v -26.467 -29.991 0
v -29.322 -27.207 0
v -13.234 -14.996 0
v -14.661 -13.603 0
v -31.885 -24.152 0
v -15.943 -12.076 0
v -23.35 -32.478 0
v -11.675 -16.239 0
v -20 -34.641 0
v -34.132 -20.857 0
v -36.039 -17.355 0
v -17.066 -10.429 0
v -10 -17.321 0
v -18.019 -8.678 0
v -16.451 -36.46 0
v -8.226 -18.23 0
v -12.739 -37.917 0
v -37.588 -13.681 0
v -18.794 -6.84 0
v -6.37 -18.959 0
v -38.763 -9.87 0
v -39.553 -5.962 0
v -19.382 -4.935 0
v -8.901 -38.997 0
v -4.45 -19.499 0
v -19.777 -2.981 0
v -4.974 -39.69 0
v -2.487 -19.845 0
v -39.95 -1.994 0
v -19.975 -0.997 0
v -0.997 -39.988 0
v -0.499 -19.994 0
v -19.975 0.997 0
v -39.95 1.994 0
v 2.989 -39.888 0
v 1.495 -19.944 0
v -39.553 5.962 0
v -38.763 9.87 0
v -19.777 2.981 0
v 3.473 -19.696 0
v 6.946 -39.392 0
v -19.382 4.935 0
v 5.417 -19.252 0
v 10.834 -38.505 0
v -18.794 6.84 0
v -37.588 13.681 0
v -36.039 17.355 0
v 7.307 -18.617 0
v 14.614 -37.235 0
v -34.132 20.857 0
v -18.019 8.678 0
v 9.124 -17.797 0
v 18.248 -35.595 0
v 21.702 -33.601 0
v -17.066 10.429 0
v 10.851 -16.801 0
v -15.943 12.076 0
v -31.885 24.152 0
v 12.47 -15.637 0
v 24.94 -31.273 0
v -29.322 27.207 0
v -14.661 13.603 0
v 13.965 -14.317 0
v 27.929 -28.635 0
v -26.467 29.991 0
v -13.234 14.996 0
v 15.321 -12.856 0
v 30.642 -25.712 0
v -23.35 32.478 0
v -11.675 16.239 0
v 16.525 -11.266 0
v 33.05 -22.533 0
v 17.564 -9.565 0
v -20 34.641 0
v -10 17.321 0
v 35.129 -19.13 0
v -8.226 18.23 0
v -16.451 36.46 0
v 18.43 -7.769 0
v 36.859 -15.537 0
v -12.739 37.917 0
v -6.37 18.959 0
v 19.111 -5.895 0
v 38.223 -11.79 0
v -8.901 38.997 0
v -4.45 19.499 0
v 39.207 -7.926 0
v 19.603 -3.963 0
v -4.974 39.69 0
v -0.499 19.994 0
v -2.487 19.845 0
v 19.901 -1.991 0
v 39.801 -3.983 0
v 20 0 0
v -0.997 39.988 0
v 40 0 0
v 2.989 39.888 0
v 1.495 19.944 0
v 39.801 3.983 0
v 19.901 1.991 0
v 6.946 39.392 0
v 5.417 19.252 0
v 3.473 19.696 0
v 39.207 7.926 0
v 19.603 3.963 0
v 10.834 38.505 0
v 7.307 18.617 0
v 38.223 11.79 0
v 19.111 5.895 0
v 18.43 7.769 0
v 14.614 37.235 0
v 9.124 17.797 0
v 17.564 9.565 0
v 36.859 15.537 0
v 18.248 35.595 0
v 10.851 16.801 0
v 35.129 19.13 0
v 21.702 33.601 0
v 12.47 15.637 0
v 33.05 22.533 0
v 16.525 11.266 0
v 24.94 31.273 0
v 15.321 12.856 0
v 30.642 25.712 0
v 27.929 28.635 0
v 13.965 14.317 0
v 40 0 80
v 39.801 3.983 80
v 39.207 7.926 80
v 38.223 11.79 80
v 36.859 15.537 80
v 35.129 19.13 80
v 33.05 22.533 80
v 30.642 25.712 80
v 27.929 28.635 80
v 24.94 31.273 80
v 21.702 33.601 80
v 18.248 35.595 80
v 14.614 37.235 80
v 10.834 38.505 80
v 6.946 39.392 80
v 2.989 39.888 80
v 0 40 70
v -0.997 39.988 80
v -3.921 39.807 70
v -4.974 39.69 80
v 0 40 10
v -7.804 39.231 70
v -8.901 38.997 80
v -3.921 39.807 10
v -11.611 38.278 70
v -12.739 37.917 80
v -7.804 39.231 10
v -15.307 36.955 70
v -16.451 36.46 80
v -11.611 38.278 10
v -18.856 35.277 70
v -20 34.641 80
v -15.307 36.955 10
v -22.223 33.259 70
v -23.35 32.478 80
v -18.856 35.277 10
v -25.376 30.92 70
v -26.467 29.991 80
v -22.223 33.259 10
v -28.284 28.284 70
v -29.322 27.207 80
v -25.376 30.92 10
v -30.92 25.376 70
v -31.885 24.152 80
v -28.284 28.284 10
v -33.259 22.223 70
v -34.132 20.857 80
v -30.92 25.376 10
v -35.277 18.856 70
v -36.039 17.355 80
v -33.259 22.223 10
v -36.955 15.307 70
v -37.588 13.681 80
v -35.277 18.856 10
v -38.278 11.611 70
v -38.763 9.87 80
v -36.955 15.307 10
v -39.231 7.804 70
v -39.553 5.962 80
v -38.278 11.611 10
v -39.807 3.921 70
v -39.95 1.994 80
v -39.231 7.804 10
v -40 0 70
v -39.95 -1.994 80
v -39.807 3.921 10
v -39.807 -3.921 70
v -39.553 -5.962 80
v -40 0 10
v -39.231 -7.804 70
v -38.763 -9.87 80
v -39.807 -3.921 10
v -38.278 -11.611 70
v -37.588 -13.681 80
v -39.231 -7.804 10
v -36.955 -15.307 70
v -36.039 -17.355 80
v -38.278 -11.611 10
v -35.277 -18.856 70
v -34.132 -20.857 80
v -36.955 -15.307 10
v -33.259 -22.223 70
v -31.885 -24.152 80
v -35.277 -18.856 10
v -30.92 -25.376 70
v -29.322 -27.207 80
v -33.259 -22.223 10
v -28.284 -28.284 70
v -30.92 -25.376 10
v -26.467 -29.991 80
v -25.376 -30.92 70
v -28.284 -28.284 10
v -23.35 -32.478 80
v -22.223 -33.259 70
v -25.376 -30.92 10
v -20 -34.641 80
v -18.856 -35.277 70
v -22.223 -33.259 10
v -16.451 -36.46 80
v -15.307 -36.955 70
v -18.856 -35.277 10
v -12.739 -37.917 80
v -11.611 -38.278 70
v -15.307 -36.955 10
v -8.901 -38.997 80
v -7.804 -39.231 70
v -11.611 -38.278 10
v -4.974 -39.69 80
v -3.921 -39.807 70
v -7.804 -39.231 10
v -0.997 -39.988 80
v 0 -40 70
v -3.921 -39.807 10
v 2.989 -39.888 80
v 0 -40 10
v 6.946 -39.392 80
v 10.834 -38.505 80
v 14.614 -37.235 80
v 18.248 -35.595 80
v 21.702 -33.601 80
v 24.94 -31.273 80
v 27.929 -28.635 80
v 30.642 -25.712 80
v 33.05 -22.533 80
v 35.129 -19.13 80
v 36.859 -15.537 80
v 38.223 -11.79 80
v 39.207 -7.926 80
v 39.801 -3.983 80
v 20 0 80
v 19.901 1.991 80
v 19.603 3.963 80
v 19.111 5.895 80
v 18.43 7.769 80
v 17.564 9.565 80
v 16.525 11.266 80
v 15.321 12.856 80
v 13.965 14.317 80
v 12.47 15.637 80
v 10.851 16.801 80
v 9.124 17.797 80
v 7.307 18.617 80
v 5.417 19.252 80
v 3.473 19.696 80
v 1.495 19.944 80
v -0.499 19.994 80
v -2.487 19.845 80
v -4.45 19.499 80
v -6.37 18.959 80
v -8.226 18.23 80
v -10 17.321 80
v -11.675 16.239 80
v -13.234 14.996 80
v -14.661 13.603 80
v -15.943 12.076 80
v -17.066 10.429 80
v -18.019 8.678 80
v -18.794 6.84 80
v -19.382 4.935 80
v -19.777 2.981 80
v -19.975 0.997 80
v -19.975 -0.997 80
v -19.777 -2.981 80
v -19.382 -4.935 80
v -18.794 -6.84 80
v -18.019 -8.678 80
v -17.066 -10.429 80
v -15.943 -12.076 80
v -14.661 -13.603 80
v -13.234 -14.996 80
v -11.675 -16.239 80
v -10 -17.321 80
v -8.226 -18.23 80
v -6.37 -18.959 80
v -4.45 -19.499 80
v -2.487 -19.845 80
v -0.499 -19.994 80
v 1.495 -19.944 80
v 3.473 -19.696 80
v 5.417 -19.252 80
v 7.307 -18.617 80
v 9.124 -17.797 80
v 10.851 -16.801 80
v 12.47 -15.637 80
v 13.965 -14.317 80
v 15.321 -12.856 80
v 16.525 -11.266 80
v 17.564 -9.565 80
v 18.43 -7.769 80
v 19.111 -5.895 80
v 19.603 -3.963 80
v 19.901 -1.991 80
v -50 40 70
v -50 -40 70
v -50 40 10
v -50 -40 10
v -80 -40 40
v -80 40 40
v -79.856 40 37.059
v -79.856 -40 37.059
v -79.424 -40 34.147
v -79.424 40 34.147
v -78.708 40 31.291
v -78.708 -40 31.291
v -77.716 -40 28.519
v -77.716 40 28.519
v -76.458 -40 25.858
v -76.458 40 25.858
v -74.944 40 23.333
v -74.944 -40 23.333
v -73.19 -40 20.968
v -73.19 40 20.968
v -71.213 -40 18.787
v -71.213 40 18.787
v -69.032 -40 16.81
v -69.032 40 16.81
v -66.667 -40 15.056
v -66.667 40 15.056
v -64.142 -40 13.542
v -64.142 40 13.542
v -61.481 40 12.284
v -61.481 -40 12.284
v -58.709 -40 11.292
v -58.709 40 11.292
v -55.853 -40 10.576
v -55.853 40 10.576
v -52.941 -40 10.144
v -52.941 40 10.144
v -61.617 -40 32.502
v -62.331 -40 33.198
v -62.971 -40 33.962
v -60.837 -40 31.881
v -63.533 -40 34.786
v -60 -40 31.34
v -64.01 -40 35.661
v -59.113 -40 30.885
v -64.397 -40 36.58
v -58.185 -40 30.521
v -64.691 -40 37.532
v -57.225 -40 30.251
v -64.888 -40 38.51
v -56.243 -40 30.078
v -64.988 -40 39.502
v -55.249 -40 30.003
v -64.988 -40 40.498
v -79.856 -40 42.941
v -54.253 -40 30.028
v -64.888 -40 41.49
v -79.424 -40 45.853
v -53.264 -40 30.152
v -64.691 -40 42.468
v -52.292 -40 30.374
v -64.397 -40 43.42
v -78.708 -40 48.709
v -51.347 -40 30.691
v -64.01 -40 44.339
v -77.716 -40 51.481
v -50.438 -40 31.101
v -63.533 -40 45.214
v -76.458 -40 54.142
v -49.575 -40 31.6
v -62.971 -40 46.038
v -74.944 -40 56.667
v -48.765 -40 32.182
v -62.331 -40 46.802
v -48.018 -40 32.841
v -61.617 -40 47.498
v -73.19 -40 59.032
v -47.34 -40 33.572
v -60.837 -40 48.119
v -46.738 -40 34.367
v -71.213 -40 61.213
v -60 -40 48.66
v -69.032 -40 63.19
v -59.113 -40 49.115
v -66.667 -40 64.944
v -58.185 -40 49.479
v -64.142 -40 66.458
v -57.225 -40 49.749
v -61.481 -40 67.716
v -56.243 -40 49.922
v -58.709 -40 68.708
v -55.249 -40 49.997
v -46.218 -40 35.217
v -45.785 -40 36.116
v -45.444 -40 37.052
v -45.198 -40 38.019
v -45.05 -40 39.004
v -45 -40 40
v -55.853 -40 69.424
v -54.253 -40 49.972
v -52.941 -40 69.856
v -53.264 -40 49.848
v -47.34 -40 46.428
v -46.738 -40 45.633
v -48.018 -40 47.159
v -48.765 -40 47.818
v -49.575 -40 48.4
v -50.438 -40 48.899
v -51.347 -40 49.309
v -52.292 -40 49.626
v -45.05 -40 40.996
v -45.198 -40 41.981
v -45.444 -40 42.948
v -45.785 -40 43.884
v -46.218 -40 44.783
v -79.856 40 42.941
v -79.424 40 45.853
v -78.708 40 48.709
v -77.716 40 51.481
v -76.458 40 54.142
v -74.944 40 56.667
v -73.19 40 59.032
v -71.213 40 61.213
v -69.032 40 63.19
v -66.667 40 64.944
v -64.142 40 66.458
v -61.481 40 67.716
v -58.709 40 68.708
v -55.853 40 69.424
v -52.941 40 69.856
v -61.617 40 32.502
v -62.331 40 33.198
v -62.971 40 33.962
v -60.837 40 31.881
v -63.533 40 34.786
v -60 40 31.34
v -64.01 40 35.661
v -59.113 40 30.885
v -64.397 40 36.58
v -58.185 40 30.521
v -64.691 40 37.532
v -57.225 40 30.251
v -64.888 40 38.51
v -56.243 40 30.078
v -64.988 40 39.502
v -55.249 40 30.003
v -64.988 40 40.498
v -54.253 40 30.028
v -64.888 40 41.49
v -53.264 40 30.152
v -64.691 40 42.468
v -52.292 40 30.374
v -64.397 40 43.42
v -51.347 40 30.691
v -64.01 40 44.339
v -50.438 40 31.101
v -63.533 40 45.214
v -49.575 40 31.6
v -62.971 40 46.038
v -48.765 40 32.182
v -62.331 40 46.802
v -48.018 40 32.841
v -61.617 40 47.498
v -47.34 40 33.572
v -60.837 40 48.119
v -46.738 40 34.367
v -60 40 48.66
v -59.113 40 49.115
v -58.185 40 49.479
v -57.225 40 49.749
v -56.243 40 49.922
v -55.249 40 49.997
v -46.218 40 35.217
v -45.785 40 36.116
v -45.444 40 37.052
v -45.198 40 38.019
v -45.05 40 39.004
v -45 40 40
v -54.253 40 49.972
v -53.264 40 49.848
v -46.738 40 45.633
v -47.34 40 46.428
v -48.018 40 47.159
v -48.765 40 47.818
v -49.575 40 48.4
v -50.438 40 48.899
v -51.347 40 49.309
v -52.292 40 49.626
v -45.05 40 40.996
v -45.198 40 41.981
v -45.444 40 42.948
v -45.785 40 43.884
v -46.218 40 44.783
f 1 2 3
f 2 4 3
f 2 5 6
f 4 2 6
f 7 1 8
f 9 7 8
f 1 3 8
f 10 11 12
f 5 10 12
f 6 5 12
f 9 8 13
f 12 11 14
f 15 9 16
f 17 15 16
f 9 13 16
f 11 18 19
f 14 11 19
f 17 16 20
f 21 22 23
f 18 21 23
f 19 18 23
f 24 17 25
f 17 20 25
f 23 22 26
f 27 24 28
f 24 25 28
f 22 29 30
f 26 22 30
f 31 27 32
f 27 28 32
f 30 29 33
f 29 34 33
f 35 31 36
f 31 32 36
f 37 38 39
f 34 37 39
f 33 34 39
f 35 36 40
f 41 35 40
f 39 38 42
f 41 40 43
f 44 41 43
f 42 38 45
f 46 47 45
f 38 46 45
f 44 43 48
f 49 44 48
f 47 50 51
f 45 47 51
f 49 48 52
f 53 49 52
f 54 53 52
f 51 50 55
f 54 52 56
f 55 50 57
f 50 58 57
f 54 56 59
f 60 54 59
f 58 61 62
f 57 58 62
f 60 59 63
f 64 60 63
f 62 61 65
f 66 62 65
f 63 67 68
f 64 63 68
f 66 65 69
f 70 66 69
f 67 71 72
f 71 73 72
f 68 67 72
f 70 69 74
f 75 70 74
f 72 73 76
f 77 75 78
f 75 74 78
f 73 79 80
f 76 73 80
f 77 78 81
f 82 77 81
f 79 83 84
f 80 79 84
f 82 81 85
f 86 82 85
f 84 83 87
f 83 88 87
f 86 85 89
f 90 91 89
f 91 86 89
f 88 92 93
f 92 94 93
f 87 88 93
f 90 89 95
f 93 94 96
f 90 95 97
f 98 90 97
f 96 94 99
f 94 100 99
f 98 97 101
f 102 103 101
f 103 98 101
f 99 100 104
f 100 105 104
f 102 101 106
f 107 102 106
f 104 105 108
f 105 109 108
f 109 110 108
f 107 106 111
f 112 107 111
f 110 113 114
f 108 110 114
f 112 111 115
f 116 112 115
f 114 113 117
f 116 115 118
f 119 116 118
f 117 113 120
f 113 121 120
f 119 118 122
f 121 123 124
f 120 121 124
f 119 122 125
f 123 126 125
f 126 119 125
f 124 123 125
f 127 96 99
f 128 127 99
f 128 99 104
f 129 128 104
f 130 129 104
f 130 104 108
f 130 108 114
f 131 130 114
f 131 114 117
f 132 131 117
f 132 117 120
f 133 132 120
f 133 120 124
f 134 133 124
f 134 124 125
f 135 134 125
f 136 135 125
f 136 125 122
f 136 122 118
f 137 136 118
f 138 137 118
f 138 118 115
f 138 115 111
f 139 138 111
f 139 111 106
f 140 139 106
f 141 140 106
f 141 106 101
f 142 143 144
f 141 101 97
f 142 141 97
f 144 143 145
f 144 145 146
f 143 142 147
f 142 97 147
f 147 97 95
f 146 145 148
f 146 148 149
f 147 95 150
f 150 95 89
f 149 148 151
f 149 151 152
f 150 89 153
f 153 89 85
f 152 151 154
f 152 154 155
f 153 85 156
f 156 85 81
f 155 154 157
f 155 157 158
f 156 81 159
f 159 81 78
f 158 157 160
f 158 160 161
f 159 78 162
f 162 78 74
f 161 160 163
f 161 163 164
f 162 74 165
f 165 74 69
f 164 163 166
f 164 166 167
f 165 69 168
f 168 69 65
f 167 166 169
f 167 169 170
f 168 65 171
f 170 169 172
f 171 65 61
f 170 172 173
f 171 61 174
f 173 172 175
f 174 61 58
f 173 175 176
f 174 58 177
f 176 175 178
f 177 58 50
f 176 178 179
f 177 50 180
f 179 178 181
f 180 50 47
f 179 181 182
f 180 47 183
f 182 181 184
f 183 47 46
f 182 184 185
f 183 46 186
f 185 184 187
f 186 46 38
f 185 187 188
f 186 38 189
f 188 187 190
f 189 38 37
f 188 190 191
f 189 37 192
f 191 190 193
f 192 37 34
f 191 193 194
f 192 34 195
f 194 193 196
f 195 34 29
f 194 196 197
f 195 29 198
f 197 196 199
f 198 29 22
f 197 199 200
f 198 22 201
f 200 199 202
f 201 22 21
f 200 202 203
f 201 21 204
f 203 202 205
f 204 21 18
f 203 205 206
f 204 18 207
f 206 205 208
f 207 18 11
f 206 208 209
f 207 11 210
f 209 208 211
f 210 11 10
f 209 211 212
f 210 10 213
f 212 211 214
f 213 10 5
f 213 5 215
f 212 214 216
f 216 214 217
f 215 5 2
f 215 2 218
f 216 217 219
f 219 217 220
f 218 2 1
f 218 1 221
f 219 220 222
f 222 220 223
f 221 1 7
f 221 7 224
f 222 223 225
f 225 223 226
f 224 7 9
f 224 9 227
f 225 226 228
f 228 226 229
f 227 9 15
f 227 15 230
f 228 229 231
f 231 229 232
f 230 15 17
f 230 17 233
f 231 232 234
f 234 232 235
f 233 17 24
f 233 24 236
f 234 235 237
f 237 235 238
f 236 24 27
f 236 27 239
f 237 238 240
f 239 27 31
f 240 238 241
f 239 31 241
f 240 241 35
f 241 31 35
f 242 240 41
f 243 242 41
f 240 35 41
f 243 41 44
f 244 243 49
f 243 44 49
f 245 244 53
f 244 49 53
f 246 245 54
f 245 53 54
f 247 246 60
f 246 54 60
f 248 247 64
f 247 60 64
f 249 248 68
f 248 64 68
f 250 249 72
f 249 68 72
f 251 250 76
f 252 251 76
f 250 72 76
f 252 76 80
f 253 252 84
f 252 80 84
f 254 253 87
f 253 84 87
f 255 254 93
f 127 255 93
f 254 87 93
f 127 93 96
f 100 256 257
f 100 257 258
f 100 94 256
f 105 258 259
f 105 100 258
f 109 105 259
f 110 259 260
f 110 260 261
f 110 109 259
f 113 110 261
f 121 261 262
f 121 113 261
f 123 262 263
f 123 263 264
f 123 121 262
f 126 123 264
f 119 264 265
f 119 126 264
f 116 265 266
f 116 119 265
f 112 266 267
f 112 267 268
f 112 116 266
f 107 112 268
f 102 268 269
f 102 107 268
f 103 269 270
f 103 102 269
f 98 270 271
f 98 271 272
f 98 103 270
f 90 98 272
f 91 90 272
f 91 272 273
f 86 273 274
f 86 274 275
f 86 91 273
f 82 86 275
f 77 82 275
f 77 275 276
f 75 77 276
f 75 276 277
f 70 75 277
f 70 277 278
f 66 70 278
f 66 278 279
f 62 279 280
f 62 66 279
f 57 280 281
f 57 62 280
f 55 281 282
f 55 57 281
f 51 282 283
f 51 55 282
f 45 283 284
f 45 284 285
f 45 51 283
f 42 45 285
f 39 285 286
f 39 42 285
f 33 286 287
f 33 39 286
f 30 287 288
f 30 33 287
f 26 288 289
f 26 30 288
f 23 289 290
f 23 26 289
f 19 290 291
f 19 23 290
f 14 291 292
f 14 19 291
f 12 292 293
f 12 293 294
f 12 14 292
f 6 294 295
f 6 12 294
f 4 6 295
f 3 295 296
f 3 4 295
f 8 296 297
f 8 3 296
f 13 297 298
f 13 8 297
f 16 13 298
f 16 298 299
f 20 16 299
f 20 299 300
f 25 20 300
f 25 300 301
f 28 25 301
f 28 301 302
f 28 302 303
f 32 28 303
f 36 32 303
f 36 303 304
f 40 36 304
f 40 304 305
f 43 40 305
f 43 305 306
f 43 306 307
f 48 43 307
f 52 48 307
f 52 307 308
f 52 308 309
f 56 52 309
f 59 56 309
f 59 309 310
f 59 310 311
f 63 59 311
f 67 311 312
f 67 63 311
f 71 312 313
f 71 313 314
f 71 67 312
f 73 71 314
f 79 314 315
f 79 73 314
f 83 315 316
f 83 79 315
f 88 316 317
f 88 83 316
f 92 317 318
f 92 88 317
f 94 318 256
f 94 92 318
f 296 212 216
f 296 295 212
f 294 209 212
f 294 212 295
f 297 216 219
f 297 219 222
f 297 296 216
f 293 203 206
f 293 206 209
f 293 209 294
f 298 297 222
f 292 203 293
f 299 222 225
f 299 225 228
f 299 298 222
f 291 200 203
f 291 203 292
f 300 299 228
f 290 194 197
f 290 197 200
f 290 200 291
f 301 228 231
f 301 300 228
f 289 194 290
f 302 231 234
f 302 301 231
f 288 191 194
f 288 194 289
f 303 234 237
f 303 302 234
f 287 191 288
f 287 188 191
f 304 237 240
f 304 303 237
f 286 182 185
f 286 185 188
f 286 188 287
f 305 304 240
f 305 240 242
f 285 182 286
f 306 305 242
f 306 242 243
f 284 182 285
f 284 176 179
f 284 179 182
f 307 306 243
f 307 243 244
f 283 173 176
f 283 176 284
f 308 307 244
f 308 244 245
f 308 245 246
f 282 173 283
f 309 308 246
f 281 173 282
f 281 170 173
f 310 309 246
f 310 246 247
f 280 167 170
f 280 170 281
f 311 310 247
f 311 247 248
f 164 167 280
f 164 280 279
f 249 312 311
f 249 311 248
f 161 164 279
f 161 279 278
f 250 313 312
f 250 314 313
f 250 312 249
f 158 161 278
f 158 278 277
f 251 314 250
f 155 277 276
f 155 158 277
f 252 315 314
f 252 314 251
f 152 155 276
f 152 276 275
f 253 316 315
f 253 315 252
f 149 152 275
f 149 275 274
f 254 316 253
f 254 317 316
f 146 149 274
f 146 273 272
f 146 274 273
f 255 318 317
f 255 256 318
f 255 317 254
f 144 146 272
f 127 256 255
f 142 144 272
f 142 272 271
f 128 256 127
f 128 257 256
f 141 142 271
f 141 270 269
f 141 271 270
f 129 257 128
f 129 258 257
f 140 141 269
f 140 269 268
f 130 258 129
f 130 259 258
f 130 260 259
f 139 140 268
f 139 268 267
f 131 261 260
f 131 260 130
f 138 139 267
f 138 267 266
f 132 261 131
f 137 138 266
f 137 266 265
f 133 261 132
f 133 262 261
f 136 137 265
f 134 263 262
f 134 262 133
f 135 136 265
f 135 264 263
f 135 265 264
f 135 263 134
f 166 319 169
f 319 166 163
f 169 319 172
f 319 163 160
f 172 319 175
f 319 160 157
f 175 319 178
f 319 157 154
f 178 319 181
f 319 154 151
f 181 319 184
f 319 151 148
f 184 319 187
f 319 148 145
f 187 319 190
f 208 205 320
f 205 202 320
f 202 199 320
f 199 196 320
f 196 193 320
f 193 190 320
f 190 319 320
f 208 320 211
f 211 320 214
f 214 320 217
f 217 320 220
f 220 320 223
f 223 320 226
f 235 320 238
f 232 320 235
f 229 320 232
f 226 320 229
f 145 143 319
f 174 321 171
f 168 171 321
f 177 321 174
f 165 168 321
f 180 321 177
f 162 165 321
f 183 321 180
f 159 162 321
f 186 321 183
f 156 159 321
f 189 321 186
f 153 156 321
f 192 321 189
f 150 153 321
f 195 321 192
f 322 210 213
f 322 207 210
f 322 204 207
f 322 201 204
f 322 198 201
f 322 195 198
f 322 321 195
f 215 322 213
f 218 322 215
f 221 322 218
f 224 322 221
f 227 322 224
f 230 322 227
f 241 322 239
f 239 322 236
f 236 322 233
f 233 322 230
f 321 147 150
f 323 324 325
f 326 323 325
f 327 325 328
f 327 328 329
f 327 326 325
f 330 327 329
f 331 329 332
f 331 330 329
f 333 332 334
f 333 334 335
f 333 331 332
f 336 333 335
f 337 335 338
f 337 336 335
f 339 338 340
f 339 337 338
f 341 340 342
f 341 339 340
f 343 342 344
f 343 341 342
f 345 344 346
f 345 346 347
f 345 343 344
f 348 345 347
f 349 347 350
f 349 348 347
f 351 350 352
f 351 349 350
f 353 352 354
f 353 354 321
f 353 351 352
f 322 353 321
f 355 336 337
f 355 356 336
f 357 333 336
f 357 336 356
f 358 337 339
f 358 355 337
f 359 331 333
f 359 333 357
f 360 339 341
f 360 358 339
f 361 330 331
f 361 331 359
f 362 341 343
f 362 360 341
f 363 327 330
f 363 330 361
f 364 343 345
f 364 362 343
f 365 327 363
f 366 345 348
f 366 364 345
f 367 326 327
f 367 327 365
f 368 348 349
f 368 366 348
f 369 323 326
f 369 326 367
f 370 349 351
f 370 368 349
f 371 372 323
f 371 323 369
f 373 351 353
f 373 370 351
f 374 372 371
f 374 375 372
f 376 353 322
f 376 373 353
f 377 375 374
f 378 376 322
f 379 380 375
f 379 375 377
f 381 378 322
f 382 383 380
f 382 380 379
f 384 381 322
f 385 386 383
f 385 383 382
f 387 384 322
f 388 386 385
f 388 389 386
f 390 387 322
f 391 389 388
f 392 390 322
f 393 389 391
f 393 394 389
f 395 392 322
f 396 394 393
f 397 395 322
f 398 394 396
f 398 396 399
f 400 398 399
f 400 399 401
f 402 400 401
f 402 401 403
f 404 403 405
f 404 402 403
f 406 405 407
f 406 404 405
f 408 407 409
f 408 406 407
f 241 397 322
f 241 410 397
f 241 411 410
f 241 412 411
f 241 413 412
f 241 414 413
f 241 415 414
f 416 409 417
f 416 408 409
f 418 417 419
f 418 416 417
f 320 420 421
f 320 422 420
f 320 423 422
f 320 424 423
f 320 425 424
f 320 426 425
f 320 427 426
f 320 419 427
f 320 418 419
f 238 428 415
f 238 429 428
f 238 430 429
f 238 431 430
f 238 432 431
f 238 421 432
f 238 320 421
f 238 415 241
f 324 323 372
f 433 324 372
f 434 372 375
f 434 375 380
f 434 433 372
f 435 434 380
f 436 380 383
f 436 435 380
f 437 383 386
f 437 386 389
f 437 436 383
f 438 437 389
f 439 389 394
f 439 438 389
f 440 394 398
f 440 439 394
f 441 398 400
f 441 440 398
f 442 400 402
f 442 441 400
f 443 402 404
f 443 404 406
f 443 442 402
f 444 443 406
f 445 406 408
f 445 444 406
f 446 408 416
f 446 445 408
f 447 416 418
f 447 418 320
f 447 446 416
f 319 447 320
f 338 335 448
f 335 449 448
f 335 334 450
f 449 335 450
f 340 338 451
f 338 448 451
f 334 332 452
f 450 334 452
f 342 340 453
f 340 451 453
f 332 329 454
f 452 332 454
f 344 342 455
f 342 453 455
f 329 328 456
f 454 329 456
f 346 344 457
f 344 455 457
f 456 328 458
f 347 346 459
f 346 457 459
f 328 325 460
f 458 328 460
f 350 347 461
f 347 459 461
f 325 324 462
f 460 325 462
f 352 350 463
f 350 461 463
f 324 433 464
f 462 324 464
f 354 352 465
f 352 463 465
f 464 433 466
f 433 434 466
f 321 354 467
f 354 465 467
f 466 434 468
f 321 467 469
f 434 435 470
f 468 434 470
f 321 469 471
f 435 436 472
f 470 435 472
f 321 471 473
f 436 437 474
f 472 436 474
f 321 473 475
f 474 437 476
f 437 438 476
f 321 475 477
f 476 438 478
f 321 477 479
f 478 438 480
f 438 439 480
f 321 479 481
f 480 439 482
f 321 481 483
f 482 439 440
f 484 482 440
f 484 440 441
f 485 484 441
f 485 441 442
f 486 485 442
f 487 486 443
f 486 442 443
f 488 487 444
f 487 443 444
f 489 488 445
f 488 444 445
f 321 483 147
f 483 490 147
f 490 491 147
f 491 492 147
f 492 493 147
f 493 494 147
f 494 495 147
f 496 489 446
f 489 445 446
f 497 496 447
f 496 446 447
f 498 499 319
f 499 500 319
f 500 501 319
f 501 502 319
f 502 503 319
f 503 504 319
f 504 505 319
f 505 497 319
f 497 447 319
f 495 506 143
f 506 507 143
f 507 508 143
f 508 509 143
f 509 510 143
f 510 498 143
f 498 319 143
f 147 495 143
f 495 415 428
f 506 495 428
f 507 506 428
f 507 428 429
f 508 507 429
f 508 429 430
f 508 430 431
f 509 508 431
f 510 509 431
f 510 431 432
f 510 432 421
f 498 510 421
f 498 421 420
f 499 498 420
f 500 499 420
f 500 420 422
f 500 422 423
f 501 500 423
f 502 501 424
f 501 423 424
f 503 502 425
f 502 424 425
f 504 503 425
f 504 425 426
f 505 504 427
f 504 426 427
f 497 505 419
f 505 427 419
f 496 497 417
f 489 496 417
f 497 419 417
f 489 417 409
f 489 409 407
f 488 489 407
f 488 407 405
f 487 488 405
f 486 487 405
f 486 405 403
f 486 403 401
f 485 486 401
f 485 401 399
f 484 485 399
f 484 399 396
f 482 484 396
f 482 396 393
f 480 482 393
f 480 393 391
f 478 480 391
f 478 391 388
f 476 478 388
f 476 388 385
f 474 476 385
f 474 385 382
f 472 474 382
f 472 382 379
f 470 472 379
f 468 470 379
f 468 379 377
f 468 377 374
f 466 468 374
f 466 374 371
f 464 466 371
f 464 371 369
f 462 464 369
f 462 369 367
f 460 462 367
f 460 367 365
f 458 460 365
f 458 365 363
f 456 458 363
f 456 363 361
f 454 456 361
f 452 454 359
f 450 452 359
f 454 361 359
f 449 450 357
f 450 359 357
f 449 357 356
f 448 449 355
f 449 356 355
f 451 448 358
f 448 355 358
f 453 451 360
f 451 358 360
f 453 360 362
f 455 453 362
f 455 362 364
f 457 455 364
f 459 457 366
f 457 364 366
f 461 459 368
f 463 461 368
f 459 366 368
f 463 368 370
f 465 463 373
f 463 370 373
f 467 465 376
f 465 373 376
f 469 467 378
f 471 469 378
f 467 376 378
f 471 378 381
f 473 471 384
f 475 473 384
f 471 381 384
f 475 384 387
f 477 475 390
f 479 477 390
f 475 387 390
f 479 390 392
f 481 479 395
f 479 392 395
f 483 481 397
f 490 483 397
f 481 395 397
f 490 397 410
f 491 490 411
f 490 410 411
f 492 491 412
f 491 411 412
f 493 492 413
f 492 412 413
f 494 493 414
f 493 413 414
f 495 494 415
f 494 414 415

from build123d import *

# Parameters (mm, degrees)
F0_R     = 40
F0_R_2   = 20
F1_DEPTH = 80
F2_W     = 80
F2_H     = 60
F3_DEPTH = 40
F4_R     = 29.99999
F5_DEPTH = 70.001
F6_R     = 10
F7_DEPTH = 80.001


# Not quite as in the source:
# - a fillet or chamfer is up to 0.001 mm smaller than in the source, because OpenCascade refuses the exact size


with BuildPart() as f1:
    # F0 (on Top) → F1 (new body)
    with BuildSketch(Plane.XY):
        Circle(F0_R)
        Circle(F0_R_2, mode=Mode.SUBTRACT)
    extrude(amount=F1_DEPTH)

    # F2 (on Front) → F3 (join, symmetric)
    with BuildSketch(Plane.XZ):
        with Locations((-40, 40)):
            Rectangle(F2_W, F2_H)
    extrude(amount=F3_DEPTH, both=True)

    # F4 (radius 30 in the source; OpenCascade refuses exactly that, so slightly less here)
    f4_edges = [f1.edges().sort_by_distance(p)[0] for p in [
        (-80, 0, 70),
        (-80, 0, 10),
    ]]
    fillet(f4_edges, radius=F4_R)

    # F5 (cut, through all): a face of the model
    f5_faces = [f1.faces().sort_by_distance(p)[0] for p in [
        (-8.4882636316, 0, 70),
    ]]
    extrude(f5_faces, amount=-F5_DEPTH, mode=Mode.SUBTRACT)

    # F6 (on face) → F7 (cut, through all)
    with BuildSketch(Plane.XZ.offset(40)):
        with Locations((-55, 40)):
            Circle(F6_R)
    extrude(amount=-F7_DEPTH, mode=Mode.SUBTRACT)


solid = f1.part
